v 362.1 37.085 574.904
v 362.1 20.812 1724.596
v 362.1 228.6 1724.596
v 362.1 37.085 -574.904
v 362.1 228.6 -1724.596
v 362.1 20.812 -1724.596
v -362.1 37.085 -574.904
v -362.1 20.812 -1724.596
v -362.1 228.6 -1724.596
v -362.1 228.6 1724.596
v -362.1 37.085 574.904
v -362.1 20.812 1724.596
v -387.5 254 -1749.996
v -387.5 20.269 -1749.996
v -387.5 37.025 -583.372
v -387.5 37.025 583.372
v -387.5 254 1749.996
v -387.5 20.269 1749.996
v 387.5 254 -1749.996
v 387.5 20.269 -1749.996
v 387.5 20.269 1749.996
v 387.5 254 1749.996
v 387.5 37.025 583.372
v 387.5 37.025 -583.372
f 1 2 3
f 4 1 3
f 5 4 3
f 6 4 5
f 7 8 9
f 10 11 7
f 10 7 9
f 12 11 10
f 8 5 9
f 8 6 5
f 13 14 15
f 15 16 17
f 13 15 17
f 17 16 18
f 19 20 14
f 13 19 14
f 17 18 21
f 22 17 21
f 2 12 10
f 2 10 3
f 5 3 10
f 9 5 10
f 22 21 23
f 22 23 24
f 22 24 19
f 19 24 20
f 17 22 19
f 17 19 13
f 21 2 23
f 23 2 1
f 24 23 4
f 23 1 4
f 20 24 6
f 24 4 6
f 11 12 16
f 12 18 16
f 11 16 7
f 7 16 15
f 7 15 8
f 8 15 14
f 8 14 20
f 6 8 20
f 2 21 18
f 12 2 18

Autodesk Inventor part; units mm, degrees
ref_plane "YZ Plane" through (0, 0, 0) normal (1, 0, 0) x (0, 1, 0)
ref_plane "XZ Plane" through (0, 0, 0) normal (0, 1, 0) x (-1, 0, 0)
ref_plane "XY Plane" through (0, 0, 0) normal (0, 0, 1) x (1, 0, 0)
sketch "Sketch1" plane through (0, 0, 0) normal (0, 1, 0) x (-1, 0, 0)
  line L0 (387.5, 1749.9965) -> (-387.5, 1749.9965)
  line L1 (-387.5, 1749.9965) -> (-387.5, -1749.9965)
  line L2 (-387.5, -1749.9965) -> (387.5, -1749.9965)
  line L3 (387.5, -1749.9965) -> (387.5, 1749.9965)
  point P0 (0, 0)
  dimension "d0" = 3499.993
  dimension "d2" = 775
extrude "Extrusion1" add sketch "Sketch1" along normal blind 254
sketch "Sketch2" plane through (0, 0, 0) normal (1, 0, 0) x (0, 1, 0)
  arc A0 (20.2692, -1749.9965) -> (20.2692, 1749.9965) centre (-81203.365, 0) ccw
  line L0 (0, 1749.9965) -> (0, -1749.9965) projected
  line L1 (254, -1749.9965) -> (254, 1749.9965) projected
  line L2 (20.2692, 1749.9965) -> (20.2692, -1749.9965)
  line L3 (20.2692, 1749.9965) -> (0, 1749.9965)
  point P0 (0, 0)
  dimension "d5" = 81242.4842
  dimension "d6" = 3499.993
  dimension "d7" = 233.7308
  dimension "d10" = 233.7308
extrude "Extrusion2" cut sketch "Sketch2" along normal blind 1057.275 and the other way blind 885.825
sketch "Sketch4" plane through (-387.5, 0, -1749.9965) normal (-1, 0, 0) x (0, 0, 1)
  line L0 (0, 0) -> (3499.993, 0) projected
  line L1 (3499.993, 20.2692) -> (0, 20.2692) projected
  line L2 (3499.993, 0) -> (3499.993, 20.2692) projected
  line L3 (0, 0) -> (0, 20.2692) projected
  point P0 (1749.9965, 0)
extrude "Extrusion3" cut sketch "Sketch4" against normal through all
shell "Shell1" thickness 25.4 removed faces 1 at (129.1667, 22.9583, -1620.385)
properties part number "CessAssemBatteryipt"
